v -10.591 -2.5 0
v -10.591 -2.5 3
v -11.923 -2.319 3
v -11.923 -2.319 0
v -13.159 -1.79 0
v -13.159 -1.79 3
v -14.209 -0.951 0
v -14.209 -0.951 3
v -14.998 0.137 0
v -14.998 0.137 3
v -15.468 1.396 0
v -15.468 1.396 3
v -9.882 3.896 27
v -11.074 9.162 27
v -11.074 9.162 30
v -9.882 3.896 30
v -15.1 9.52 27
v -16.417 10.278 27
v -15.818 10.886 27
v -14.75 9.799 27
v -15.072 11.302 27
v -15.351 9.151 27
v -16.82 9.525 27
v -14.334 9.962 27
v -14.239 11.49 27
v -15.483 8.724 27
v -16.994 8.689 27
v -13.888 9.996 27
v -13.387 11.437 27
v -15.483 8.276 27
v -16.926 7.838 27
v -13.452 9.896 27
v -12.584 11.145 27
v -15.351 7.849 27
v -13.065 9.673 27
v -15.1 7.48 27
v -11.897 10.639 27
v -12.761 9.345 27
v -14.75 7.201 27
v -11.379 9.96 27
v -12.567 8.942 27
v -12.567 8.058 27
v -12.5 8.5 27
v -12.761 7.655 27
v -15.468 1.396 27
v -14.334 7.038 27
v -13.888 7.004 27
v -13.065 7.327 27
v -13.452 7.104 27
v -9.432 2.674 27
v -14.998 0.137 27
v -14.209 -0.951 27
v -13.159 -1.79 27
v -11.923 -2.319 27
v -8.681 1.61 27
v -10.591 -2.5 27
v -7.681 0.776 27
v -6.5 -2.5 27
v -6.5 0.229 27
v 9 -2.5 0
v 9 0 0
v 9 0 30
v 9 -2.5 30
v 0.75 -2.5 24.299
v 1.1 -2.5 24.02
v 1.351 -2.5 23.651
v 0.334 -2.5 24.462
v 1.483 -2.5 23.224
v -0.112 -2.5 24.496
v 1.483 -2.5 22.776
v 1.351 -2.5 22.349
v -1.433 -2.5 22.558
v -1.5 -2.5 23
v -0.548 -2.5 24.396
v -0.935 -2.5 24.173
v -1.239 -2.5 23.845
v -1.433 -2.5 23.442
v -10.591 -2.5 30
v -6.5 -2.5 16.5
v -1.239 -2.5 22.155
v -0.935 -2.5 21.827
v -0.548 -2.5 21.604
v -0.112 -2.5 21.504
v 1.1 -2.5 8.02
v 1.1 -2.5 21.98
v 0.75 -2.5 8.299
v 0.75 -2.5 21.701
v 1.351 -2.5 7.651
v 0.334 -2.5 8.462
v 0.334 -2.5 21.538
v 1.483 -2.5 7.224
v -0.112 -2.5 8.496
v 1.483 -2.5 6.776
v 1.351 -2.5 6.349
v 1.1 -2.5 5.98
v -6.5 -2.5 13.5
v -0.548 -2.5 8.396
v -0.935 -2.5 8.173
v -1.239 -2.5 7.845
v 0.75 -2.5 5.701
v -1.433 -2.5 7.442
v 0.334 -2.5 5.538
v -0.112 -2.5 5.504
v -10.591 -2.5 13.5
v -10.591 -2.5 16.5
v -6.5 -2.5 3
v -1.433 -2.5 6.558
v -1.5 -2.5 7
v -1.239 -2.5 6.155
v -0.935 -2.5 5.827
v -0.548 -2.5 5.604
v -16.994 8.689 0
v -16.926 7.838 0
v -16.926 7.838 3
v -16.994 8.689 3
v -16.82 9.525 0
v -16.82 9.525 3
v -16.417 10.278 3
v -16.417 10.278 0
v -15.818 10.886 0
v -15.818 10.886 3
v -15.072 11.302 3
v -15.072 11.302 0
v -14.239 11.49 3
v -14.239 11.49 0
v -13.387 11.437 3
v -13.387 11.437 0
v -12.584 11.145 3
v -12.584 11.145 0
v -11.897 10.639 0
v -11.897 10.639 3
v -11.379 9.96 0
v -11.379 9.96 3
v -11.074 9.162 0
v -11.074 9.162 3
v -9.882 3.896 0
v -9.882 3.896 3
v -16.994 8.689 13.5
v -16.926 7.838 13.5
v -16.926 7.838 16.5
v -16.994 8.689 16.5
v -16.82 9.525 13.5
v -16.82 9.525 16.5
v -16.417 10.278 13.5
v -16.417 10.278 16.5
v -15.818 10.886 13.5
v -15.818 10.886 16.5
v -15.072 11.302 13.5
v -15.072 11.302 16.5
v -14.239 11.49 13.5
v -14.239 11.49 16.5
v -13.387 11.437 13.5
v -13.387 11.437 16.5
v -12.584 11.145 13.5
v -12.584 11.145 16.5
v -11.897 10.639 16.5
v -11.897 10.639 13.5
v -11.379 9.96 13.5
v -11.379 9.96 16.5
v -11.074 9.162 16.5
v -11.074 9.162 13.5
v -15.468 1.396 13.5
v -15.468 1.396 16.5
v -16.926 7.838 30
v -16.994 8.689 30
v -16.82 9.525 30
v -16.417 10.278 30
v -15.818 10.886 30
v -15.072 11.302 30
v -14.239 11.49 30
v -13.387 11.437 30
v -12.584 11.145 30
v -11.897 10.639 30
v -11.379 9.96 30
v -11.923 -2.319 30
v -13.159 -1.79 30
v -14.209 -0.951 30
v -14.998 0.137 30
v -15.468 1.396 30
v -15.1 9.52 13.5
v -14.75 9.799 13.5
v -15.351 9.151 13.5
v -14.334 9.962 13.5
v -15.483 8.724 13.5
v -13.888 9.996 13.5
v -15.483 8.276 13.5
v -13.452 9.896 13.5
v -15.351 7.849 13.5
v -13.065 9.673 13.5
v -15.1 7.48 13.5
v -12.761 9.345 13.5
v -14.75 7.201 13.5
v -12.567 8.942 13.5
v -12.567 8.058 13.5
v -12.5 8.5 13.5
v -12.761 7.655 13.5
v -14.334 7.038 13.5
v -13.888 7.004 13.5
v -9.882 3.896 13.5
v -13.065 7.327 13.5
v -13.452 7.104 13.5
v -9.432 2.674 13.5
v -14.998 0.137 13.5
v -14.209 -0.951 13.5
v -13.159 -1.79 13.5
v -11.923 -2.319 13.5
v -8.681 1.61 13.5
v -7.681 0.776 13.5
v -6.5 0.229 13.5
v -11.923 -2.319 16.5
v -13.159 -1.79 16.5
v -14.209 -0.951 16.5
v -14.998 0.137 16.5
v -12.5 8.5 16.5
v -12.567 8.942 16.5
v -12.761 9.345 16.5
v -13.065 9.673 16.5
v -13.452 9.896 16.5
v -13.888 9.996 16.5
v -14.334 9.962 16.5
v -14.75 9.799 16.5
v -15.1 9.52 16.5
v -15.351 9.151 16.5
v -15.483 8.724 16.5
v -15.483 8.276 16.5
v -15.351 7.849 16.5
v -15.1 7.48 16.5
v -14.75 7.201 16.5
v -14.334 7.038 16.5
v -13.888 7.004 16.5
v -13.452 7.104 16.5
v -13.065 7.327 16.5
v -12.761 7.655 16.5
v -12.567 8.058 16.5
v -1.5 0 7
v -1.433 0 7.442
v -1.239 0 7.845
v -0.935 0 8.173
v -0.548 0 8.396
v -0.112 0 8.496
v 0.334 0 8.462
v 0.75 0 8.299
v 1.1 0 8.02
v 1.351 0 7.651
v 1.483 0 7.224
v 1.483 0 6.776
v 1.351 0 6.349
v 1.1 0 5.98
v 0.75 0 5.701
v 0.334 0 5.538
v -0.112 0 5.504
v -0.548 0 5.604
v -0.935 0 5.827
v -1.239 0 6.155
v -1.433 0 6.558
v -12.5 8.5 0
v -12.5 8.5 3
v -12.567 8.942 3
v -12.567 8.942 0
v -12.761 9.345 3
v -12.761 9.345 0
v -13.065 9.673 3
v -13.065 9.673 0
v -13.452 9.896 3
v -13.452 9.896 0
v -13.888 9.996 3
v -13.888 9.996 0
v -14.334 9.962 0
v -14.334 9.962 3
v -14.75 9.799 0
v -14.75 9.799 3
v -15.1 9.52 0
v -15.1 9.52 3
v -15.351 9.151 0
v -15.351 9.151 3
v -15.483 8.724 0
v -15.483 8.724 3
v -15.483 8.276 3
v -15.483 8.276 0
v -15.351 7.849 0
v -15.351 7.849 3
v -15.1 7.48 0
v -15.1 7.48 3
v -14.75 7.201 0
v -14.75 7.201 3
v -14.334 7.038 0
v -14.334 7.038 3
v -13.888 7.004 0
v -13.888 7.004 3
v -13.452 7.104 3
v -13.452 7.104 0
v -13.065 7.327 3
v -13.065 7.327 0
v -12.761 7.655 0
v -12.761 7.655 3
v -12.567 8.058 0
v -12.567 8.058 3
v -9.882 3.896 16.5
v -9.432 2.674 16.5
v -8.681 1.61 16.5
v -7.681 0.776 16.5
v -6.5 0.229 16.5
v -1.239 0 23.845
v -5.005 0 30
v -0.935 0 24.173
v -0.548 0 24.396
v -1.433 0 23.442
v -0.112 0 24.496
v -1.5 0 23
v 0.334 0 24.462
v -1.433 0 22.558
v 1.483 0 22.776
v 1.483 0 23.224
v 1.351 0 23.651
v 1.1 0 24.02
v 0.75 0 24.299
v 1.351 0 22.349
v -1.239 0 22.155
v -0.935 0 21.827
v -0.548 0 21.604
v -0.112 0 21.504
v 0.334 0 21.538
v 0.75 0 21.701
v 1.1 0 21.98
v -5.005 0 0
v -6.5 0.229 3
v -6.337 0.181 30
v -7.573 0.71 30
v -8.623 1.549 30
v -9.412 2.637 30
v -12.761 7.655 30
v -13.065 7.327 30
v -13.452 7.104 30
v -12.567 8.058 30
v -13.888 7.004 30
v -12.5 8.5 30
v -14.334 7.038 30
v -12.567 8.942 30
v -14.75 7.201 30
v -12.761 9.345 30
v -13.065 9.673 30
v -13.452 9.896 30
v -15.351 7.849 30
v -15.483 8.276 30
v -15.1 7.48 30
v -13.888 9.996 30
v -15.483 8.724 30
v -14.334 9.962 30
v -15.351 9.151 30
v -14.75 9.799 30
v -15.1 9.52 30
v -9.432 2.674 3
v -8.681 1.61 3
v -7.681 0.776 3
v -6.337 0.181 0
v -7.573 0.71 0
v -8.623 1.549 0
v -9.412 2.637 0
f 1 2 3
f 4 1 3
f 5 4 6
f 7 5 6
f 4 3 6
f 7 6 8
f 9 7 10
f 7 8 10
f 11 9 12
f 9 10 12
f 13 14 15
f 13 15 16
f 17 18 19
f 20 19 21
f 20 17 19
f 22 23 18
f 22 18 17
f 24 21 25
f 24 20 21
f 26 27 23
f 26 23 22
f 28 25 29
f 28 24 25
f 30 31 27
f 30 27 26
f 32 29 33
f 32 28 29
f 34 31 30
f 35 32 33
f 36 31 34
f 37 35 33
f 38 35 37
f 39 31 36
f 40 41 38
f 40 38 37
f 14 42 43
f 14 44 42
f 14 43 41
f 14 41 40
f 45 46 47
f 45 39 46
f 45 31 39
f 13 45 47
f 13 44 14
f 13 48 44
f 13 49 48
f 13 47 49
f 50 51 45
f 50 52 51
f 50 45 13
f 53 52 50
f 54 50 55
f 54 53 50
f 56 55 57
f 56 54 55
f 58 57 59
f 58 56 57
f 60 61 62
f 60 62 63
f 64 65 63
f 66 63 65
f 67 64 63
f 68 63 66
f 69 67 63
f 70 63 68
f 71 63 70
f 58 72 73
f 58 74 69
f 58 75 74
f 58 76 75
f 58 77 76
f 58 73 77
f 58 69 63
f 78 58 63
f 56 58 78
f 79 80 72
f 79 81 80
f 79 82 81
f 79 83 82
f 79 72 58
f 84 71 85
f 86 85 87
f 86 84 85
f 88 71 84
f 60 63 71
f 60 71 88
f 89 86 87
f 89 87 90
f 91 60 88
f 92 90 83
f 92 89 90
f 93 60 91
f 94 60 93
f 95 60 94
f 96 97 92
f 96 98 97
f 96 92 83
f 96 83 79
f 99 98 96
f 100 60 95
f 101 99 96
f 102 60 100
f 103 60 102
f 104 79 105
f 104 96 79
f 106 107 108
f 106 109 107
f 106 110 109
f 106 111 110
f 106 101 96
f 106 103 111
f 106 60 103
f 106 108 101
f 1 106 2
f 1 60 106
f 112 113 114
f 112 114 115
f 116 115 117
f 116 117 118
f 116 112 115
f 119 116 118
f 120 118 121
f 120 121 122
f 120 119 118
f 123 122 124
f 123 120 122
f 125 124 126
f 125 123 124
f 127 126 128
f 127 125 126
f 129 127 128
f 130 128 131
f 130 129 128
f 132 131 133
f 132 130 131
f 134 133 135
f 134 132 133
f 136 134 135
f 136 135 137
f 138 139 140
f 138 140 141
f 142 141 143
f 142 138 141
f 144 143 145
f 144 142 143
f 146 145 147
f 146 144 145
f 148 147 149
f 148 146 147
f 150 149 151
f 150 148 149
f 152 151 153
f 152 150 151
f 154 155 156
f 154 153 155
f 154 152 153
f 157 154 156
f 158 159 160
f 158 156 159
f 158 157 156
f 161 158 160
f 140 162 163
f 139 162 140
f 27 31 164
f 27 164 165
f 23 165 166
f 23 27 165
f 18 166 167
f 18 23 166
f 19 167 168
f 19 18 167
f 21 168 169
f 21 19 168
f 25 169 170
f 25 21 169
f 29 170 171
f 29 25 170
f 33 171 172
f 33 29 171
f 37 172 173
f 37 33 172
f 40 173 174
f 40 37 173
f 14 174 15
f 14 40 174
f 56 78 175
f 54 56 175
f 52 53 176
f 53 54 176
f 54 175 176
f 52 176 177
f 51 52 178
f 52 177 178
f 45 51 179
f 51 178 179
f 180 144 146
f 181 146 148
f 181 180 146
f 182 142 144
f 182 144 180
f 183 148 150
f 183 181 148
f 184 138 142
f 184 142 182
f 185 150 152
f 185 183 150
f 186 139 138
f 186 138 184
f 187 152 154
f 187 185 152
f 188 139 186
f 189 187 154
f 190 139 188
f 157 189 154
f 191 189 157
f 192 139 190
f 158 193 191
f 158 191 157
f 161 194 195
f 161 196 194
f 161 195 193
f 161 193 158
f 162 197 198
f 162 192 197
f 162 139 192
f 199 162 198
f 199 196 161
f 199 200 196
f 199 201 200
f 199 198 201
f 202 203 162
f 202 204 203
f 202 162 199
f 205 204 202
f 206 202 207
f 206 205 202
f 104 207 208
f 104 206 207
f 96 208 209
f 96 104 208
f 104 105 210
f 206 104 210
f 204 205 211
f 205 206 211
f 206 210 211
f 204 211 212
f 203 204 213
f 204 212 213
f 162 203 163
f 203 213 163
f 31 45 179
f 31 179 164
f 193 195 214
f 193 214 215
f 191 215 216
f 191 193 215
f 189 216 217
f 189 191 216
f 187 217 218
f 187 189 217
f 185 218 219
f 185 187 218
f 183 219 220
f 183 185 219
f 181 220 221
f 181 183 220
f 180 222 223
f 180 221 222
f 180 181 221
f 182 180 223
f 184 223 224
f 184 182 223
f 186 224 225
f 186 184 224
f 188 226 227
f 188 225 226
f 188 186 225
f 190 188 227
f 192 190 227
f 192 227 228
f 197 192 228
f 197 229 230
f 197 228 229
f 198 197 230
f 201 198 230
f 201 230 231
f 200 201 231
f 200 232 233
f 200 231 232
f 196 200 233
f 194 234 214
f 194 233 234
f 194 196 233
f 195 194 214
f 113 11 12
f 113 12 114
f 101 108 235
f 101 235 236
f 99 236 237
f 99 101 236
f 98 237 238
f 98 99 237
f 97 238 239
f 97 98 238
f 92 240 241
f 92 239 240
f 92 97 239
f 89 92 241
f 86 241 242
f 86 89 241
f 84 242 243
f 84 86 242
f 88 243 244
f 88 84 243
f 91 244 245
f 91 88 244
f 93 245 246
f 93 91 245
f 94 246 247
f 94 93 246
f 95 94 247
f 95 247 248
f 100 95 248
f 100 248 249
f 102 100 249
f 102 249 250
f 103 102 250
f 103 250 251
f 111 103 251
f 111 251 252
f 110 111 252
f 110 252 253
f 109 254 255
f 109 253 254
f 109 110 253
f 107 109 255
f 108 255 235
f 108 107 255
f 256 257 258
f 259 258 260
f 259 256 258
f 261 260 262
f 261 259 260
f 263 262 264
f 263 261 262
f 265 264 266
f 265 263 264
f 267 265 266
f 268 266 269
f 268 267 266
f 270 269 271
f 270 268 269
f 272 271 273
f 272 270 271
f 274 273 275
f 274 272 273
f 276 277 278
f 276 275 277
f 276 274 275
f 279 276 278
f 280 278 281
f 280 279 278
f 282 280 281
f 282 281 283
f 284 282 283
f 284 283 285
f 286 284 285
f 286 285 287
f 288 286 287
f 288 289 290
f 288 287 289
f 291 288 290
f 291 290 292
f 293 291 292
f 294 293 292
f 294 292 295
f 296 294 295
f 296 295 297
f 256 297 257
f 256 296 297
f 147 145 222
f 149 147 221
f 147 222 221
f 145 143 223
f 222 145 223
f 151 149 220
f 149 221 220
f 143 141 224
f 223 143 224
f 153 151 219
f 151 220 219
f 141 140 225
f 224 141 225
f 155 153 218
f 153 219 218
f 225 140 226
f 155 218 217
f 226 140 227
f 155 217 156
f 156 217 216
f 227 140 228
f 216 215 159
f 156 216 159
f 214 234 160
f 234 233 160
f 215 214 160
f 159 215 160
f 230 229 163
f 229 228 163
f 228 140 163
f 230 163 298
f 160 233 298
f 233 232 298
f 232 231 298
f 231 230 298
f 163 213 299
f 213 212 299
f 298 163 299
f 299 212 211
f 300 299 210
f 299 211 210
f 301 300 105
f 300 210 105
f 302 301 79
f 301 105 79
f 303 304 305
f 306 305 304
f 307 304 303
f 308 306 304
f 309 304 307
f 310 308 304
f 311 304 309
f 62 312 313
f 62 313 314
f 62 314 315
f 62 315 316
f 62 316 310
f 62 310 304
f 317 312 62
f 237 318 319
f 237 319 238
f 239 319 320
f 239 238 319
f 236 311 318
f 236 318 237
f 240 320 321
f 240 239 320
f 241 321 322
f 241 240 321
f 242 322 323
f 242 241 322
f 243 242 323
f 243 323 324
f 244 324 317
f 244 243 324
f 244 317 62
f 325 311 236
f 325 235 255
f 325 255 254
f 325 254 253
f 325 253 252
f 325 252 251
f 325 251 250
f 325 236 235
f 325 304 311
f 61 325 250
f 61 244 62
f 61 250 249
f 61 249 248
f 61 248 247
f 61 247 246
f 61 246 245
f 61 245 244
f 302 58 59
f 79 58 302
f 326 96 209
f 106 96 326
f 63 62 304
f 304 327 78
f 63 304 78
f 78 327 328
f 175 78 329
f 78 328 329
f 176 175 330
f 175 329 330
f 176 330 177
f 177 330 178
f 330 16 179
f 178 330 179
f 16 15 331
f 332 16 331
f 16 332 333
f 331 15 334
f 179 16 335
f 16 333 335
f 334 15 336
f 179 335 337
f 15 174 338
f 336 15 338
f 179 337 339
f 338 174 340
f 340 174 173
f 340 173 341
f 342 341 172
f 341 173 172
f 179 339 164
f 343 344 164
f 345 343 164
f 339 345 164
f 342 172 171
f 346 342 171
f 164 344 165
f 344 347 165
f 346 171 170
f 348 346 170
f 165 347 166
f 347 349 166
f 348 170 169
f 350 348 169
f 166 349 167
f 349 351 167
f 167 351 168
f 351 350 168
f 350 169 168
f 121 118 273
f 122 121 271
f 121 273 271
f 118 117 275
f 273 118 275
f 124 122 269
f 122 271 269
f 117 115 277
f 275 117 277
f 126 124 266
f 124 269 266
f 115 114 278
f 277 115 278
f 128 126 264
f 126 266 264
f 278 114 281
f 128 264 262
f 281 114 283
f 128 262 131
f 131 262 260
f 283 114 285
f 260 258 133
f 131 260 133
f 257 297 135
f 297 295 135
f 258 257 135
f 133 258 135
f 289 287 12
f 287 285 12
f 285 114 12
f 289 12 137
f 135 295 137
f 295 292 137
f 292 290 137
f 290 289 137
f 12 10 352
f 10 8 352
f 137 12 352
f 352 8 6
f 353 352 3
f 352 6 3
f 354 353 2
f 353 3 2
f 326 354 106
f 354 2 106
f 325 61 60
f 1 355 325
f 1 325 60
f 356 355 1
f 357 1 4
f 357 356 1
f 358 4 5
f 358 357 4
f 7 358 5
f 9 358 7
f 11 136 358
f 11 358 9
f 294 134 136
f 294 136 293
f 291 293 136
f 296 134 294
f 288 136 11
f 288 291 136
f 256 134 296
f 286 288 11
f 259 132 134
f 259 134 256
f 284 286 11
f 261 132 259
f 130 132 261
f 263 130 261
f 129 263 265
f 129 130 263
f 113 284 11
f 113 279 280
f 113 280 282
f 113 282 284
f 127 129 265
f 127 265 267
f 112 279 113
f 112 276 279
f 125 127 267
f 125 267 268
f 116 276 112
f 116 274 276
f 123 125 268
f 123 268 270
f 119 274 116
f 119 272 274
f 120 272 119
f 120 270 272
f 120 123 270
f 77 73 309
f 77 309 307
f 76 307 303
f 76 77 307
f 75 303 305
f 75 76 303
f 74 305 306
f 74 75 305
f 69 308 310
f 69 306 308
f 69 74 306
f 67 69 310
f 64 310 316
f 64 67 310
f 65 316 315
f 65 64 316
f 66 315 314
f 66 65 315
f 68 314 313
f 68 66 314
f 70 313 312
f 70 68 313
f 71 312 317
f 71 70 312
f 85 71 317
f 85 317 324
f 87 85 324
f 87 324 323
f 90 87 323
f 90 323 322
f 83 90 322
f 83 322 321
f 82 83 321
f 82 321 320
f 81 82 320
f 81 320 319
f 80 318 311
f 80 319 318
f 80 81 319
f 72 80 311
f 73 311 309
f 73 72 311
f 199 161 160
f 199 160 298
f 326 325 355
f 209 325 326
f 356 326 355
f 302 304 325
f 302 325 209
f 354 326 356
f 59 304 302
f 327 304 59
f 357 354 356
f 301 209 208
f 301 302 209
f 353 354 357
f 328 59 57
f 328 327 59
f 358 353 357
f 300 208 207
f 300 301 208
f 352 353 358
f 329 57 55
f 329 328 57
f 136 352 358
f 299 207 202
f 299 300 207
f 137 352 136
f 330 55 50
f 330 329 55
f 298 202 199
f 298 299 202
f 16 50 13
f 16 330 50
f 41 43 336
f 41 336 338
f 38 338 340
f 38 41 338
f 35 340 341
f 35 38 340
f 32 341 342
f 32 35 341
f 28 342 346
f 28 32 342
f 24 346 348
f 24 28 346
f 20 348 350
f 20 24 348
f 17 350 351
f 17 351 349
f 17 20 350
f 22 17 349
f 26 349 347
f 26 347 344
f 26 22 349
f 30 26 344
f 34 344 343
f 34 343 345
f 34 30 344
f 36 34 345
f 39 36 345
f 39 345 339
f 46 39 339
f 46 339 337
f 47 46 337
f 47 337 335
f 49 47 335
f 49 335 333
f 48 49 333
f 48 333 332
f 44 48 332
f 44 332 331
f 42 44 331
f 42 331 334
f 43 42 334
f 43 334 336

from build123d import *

# Parameters (mm, degrees)
ESBO_O1_R                  = 1.5
RESSALTO_EXTRUS_O1_DEPTH   = 30
FILETE1_R                  = 5
CORTE_EXTRUS_O1_DEPTH      = 37.349002737
CORTE_EXTRUS_O1_DEPTH_BACK = 37.349002737
ESBO_O2_R                  = 1.5
ESBO_O2_W                  = 10.5
ESBO_O2_H                  = 10.5


with BuildPart() as part:
    # Esboço1 → Ressalto-extrusão1 (new body)
    with BuildSketch(Plane.XY):
        with BuildLine():
            Line((-9, 0), (9, 0))
            Line((9, 0), (9, -2.5))
            Line((9, -2.5), (-14.585891007, -2.5))
            Line((-14.585891007, -2.5), (-16.925971737, 7.837663684))
            ThreePointArc((-16.925971737, 7.837663684), (-14.662336316, 11.425971737), (-11.074028263, 9.162336316))
            Line((-11.074028263, 9.162336316), (-9, 0))
        make_face()
        with Locations((-14, 8.5)):
            Circle(ESBO_O1_R, mode=Mode.SUBTRACT)
    extrude(amount=RESSALTO_EXTRUS_O1_DEPTH)

    # Filete1
    filete1_edges = [part.edges().sort_by_distance(p)[0] for p in [
        (-14.585891007, -2.5, 15),
        (-9, 0, 15),
    ]]
    fillet(filete1_edges, radius=FILETE1_R)

    # Esboço2 → Corte-extrusão1 (cut, two sides: drawn at the far end of the back side and taken through both)
    with BuildSketch(Plane(origin=(0, 0, 0), x_dir=(1, 0, 0), z_dir=(0, 1, 0)).offset(-CORTE_EXTRUS_O1_DEPTH_BACK)):
        with Locations(Location((0, -7, 0), (0, 0, 180))):
            Circle(ESBO_O2_R)
        with Locations(Location((0, -23, 0), (0, 0, 180))):
            Circle(ESBO_O2_R)
        with Locations((-11.75, -8.25)):
            Rectangle(ESBO_O2_W, ESBO_O2_H)
        with Locations((-11.75, -21.75)):
            Rectangle(ESBO_O2_W, ESBO_O2_H)
    extrude(amount=CORTE_EXTRUS_O1_DEPTH + CORTE_EXTRUS_O1_DEPTH_BACK, mode=Mode.SUBTRACT)


solid = part.part
